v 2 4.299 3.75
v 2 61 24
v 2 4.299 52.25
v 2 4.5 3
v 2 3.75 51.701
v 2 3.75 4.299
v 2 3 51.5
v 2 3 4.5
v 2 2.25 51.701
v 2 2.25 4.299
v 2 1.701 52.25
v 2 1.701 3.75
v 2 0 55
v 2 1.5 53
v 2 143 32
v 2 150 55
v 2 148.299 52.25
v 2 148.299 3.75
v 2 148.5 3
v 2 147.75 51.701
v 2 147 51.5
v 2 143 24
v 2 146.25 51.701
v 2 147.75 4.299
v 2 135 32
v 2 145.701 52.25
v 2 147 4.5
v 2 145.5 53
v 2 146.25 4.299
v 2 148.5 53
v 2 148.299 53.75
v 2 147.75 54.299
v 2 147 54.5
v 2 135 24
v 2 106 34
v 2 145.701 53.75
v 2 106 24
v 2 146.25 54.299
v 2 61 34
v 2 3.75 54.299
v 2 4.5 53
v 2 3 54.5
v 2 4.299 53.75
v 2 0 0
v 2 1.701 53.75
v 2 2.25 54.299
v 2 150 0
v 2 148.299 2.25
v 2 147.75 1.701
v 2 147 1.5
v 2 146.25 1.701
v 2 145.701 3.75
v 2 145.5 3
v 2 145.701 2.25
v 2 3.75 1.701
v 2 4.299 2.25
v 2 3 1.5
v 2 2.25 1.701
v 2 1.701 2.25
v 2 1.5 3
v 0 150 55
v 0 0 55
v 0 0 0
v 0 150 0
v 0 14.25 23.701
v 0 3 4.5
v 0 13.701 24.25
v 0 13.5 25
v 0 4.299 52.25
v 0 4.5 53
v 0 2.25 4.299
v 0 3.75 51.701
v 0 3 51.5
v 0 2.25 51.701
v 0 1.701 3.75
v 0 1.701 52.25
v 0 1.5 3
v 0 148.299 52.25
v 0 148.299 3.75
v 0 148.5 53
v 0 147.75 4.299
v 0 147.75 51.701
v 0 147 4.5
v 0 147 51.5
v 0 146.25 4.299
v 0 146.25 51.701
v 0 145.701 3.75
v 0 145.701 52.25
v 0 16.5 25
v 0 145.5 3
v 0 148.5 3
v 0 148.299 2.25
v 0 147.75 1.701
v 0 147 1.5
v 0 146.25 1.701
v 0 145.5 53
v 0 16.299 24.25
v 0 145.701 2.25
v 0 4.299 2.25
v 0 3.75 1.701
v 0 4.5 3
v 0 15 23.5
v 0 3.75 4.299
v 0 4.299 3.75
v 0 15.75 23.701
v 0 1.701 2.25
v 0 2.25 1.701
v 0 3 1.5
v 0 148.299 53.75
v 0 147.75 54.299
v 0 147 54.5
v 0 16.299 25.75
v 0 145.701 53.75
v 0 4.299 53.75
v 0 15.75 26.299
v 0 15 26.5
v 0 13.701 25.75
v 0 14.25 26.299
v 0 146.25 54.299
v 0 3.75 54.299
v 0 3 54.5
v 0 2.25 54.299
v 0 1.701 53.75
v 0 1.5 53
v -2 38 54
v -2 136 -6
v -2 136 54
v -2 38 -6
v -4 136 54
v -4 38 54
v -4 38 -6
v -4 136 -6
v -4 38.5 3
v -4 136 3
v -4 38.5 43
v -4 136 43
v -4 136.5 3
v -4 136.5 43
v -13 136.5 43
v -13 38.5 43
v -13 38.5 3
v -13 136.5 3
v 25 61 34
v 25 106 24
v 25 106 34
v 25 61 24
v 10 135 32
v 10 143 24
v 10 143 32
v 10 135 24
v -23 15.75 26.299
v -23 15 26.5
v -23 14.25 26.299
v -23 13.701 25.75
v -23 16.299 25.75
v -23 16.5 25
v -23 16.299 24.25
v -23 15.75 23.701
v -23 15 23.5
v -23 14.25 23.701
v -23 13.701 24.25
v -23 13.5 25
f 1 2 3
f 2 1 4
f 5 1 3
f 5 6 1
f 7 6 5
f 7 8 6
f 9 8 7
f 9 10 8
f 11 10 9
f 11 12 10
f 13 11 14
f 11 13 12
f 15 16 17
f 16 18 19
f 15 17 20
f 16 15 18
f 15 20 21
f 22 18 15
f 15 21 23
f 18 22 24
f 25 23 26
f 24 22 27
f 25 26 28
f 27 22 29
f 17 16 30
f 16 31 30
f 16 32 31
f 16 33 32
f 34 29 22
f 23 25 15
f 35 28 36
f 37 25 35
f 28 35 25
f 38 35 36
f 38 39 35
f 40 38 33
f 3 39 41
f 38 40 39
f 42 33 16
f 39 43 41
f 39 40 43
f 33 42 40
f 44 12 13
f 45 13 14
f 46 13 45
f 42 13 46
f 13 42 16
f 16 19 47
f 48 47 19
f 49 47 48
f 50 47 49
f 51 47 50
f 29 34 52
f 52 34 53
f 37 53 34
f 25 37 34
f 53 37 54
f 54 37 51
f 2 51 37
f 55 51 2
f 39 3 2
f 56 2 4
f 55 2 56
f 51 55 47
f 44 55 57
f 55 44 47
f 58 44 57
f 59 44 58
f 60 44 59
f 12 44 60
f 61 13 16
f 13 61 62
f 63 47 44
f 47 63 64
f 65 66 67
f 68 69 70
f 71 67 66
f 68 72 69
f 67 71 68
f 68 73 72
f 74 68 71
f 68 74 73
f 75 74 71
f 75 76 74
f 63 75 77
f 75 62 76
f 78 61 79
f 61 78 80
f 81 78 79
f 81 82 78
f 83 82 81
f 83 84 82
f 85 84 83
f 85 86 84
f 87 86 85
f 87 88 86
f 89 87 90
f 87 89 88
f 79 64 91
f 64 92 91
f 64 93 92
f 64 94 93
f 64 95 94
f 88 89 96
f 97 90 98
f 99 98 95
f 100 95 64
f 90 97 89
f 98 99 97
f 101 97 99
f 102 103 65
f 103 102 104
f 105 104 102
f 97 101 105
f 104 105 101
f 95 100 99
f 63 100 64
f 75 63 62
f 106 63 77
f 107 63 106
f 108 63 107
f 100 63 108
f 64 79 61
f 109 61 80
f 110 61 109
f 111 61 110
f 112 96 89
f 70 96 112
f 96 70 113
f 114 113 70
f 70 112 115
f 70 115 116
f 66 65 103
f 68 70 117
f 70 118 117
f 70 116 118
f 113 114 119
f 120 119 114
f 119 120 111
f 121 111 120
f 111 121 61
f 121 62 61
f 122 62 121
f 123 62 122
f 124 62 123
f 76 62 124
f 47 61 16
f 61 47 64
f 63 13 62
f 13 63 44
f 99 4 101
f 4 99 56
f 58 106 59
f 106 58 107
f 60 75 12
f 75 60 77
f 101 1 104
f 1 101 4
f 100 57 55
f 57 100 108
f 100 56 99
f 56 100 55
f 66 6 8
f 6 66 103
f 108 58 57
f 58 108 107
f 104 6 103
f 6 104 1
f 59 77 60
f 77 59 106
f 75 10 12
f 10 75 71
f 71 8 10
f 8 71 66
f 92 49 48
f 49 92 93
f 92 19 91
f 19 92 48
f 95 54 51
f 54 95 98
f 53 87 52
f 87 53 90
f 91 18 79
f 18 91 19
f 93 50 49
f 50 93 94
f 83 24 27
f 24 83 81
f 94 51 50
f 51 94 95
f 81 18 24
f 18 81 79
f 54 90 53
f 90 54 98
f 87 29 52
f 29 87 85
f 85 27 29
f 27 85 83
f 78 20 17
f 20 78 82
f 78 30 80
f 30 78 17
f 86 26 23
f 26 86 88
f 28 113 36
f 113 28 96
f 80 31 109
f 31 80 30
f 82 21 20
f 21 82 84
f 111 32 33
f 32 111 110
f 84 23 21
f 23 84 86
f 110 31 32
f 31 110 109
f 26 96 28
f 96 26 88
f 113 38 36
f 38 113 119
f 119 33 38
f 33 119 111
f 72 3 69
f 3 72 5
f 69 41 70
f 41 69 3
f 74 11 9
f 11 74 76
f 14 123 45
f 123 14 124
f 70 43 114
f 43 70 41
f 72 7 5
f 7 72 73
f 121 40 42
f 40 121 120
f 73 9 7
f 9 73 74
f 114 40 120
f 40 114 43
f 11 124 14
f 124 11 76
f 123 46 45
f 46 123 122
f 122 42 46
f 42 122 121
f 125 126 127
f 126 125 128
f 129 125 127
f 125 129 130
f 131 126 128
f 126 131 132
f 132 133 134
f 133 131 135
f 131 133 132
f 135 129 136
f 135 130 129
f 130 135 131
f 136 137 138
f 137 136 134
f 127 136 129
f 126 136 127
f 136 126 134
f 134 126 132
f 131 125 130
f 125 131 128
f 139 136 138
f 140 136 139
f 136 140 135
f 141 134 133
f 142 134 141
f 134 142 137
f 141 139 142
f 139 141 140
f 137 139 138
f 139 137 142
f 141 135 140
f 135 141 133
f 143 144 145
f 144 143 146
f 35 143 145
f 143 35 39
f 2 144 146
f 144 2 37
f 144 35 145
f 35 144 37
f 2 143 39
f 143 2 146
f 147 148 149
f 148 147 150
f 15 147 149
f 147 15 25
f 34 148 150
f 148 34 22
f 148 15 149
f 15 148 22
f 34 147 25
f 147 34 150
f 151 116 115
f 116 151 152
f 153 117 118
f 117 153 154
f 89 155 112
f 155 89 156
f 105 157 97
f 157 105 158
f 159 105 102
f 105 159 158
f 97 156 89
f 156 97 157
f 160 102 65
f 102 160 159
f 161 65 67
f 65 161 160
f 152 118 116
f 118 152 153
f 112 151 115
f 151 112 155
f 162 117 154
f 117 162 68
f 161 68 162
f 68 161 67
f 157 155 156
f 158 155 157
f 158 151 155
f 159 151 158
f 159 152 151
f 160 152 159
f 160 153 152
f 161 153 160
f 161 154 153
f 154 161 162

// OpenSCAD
// 2004 smart lcd controller
module LCD20x4SmartController(holesOnly=0)
{
	if( holesOnly==0 )
	{
		difference()
		{
			color("brown") cube([2,150,55]);
			// holes
			color("red") translate([-3,3,3]) rotate([0,90,0]) cylinder(d=3,h=50,$fn=12);
			color("red") translate([-3,150-3,3]) rotate([0,90,0]) cylinder(d=3,h=50,$fn=12);
			color("red") translate([-3,150-3,56-3]) rotate([0,90,0]) cylinder(d=3,h=50,$fn=12);
			color("red") translate([-3,3,56-3]) rotate([0,90,0]) cylinder(d=3,h=50,$fn=12);
		}
		translate([-(2+2),38,-6]) color("green") cube([2,98,60]);
		translate([-13,38.5,3]) color("blue") cube([9,98,40]);
		translate([0,61,24]) color("white") cube([25,45,10]);
		translate([2,135,24]) color("white") cube([8,8,8]);
		// tripot
		translate([0,15,25]) color("green") rotate([0,-90,0]) cylinder(d=3,h=23,$fn=12);
	}
	else
	{
		// holes
		color("red") translate([-30,3,3]) rotate([0,90,0]) cylinder(d=3,h=150,$fn=12);
		color("red") translate([-30,150-3,3]) rotate([0,90,0]) cylinder(d=3,h=150,$fn=12);
		color("red") translate([-30,150-3,56-3]) rotate([0,90,0]) cylinder(d=3,h=150,$fn=12);
		color("red") translate([-30,3,56-3]) rotate([0,90,0]) cylinder(d=3,h=150,$fn=12);
	}
}
LCD20x4SmartController();
